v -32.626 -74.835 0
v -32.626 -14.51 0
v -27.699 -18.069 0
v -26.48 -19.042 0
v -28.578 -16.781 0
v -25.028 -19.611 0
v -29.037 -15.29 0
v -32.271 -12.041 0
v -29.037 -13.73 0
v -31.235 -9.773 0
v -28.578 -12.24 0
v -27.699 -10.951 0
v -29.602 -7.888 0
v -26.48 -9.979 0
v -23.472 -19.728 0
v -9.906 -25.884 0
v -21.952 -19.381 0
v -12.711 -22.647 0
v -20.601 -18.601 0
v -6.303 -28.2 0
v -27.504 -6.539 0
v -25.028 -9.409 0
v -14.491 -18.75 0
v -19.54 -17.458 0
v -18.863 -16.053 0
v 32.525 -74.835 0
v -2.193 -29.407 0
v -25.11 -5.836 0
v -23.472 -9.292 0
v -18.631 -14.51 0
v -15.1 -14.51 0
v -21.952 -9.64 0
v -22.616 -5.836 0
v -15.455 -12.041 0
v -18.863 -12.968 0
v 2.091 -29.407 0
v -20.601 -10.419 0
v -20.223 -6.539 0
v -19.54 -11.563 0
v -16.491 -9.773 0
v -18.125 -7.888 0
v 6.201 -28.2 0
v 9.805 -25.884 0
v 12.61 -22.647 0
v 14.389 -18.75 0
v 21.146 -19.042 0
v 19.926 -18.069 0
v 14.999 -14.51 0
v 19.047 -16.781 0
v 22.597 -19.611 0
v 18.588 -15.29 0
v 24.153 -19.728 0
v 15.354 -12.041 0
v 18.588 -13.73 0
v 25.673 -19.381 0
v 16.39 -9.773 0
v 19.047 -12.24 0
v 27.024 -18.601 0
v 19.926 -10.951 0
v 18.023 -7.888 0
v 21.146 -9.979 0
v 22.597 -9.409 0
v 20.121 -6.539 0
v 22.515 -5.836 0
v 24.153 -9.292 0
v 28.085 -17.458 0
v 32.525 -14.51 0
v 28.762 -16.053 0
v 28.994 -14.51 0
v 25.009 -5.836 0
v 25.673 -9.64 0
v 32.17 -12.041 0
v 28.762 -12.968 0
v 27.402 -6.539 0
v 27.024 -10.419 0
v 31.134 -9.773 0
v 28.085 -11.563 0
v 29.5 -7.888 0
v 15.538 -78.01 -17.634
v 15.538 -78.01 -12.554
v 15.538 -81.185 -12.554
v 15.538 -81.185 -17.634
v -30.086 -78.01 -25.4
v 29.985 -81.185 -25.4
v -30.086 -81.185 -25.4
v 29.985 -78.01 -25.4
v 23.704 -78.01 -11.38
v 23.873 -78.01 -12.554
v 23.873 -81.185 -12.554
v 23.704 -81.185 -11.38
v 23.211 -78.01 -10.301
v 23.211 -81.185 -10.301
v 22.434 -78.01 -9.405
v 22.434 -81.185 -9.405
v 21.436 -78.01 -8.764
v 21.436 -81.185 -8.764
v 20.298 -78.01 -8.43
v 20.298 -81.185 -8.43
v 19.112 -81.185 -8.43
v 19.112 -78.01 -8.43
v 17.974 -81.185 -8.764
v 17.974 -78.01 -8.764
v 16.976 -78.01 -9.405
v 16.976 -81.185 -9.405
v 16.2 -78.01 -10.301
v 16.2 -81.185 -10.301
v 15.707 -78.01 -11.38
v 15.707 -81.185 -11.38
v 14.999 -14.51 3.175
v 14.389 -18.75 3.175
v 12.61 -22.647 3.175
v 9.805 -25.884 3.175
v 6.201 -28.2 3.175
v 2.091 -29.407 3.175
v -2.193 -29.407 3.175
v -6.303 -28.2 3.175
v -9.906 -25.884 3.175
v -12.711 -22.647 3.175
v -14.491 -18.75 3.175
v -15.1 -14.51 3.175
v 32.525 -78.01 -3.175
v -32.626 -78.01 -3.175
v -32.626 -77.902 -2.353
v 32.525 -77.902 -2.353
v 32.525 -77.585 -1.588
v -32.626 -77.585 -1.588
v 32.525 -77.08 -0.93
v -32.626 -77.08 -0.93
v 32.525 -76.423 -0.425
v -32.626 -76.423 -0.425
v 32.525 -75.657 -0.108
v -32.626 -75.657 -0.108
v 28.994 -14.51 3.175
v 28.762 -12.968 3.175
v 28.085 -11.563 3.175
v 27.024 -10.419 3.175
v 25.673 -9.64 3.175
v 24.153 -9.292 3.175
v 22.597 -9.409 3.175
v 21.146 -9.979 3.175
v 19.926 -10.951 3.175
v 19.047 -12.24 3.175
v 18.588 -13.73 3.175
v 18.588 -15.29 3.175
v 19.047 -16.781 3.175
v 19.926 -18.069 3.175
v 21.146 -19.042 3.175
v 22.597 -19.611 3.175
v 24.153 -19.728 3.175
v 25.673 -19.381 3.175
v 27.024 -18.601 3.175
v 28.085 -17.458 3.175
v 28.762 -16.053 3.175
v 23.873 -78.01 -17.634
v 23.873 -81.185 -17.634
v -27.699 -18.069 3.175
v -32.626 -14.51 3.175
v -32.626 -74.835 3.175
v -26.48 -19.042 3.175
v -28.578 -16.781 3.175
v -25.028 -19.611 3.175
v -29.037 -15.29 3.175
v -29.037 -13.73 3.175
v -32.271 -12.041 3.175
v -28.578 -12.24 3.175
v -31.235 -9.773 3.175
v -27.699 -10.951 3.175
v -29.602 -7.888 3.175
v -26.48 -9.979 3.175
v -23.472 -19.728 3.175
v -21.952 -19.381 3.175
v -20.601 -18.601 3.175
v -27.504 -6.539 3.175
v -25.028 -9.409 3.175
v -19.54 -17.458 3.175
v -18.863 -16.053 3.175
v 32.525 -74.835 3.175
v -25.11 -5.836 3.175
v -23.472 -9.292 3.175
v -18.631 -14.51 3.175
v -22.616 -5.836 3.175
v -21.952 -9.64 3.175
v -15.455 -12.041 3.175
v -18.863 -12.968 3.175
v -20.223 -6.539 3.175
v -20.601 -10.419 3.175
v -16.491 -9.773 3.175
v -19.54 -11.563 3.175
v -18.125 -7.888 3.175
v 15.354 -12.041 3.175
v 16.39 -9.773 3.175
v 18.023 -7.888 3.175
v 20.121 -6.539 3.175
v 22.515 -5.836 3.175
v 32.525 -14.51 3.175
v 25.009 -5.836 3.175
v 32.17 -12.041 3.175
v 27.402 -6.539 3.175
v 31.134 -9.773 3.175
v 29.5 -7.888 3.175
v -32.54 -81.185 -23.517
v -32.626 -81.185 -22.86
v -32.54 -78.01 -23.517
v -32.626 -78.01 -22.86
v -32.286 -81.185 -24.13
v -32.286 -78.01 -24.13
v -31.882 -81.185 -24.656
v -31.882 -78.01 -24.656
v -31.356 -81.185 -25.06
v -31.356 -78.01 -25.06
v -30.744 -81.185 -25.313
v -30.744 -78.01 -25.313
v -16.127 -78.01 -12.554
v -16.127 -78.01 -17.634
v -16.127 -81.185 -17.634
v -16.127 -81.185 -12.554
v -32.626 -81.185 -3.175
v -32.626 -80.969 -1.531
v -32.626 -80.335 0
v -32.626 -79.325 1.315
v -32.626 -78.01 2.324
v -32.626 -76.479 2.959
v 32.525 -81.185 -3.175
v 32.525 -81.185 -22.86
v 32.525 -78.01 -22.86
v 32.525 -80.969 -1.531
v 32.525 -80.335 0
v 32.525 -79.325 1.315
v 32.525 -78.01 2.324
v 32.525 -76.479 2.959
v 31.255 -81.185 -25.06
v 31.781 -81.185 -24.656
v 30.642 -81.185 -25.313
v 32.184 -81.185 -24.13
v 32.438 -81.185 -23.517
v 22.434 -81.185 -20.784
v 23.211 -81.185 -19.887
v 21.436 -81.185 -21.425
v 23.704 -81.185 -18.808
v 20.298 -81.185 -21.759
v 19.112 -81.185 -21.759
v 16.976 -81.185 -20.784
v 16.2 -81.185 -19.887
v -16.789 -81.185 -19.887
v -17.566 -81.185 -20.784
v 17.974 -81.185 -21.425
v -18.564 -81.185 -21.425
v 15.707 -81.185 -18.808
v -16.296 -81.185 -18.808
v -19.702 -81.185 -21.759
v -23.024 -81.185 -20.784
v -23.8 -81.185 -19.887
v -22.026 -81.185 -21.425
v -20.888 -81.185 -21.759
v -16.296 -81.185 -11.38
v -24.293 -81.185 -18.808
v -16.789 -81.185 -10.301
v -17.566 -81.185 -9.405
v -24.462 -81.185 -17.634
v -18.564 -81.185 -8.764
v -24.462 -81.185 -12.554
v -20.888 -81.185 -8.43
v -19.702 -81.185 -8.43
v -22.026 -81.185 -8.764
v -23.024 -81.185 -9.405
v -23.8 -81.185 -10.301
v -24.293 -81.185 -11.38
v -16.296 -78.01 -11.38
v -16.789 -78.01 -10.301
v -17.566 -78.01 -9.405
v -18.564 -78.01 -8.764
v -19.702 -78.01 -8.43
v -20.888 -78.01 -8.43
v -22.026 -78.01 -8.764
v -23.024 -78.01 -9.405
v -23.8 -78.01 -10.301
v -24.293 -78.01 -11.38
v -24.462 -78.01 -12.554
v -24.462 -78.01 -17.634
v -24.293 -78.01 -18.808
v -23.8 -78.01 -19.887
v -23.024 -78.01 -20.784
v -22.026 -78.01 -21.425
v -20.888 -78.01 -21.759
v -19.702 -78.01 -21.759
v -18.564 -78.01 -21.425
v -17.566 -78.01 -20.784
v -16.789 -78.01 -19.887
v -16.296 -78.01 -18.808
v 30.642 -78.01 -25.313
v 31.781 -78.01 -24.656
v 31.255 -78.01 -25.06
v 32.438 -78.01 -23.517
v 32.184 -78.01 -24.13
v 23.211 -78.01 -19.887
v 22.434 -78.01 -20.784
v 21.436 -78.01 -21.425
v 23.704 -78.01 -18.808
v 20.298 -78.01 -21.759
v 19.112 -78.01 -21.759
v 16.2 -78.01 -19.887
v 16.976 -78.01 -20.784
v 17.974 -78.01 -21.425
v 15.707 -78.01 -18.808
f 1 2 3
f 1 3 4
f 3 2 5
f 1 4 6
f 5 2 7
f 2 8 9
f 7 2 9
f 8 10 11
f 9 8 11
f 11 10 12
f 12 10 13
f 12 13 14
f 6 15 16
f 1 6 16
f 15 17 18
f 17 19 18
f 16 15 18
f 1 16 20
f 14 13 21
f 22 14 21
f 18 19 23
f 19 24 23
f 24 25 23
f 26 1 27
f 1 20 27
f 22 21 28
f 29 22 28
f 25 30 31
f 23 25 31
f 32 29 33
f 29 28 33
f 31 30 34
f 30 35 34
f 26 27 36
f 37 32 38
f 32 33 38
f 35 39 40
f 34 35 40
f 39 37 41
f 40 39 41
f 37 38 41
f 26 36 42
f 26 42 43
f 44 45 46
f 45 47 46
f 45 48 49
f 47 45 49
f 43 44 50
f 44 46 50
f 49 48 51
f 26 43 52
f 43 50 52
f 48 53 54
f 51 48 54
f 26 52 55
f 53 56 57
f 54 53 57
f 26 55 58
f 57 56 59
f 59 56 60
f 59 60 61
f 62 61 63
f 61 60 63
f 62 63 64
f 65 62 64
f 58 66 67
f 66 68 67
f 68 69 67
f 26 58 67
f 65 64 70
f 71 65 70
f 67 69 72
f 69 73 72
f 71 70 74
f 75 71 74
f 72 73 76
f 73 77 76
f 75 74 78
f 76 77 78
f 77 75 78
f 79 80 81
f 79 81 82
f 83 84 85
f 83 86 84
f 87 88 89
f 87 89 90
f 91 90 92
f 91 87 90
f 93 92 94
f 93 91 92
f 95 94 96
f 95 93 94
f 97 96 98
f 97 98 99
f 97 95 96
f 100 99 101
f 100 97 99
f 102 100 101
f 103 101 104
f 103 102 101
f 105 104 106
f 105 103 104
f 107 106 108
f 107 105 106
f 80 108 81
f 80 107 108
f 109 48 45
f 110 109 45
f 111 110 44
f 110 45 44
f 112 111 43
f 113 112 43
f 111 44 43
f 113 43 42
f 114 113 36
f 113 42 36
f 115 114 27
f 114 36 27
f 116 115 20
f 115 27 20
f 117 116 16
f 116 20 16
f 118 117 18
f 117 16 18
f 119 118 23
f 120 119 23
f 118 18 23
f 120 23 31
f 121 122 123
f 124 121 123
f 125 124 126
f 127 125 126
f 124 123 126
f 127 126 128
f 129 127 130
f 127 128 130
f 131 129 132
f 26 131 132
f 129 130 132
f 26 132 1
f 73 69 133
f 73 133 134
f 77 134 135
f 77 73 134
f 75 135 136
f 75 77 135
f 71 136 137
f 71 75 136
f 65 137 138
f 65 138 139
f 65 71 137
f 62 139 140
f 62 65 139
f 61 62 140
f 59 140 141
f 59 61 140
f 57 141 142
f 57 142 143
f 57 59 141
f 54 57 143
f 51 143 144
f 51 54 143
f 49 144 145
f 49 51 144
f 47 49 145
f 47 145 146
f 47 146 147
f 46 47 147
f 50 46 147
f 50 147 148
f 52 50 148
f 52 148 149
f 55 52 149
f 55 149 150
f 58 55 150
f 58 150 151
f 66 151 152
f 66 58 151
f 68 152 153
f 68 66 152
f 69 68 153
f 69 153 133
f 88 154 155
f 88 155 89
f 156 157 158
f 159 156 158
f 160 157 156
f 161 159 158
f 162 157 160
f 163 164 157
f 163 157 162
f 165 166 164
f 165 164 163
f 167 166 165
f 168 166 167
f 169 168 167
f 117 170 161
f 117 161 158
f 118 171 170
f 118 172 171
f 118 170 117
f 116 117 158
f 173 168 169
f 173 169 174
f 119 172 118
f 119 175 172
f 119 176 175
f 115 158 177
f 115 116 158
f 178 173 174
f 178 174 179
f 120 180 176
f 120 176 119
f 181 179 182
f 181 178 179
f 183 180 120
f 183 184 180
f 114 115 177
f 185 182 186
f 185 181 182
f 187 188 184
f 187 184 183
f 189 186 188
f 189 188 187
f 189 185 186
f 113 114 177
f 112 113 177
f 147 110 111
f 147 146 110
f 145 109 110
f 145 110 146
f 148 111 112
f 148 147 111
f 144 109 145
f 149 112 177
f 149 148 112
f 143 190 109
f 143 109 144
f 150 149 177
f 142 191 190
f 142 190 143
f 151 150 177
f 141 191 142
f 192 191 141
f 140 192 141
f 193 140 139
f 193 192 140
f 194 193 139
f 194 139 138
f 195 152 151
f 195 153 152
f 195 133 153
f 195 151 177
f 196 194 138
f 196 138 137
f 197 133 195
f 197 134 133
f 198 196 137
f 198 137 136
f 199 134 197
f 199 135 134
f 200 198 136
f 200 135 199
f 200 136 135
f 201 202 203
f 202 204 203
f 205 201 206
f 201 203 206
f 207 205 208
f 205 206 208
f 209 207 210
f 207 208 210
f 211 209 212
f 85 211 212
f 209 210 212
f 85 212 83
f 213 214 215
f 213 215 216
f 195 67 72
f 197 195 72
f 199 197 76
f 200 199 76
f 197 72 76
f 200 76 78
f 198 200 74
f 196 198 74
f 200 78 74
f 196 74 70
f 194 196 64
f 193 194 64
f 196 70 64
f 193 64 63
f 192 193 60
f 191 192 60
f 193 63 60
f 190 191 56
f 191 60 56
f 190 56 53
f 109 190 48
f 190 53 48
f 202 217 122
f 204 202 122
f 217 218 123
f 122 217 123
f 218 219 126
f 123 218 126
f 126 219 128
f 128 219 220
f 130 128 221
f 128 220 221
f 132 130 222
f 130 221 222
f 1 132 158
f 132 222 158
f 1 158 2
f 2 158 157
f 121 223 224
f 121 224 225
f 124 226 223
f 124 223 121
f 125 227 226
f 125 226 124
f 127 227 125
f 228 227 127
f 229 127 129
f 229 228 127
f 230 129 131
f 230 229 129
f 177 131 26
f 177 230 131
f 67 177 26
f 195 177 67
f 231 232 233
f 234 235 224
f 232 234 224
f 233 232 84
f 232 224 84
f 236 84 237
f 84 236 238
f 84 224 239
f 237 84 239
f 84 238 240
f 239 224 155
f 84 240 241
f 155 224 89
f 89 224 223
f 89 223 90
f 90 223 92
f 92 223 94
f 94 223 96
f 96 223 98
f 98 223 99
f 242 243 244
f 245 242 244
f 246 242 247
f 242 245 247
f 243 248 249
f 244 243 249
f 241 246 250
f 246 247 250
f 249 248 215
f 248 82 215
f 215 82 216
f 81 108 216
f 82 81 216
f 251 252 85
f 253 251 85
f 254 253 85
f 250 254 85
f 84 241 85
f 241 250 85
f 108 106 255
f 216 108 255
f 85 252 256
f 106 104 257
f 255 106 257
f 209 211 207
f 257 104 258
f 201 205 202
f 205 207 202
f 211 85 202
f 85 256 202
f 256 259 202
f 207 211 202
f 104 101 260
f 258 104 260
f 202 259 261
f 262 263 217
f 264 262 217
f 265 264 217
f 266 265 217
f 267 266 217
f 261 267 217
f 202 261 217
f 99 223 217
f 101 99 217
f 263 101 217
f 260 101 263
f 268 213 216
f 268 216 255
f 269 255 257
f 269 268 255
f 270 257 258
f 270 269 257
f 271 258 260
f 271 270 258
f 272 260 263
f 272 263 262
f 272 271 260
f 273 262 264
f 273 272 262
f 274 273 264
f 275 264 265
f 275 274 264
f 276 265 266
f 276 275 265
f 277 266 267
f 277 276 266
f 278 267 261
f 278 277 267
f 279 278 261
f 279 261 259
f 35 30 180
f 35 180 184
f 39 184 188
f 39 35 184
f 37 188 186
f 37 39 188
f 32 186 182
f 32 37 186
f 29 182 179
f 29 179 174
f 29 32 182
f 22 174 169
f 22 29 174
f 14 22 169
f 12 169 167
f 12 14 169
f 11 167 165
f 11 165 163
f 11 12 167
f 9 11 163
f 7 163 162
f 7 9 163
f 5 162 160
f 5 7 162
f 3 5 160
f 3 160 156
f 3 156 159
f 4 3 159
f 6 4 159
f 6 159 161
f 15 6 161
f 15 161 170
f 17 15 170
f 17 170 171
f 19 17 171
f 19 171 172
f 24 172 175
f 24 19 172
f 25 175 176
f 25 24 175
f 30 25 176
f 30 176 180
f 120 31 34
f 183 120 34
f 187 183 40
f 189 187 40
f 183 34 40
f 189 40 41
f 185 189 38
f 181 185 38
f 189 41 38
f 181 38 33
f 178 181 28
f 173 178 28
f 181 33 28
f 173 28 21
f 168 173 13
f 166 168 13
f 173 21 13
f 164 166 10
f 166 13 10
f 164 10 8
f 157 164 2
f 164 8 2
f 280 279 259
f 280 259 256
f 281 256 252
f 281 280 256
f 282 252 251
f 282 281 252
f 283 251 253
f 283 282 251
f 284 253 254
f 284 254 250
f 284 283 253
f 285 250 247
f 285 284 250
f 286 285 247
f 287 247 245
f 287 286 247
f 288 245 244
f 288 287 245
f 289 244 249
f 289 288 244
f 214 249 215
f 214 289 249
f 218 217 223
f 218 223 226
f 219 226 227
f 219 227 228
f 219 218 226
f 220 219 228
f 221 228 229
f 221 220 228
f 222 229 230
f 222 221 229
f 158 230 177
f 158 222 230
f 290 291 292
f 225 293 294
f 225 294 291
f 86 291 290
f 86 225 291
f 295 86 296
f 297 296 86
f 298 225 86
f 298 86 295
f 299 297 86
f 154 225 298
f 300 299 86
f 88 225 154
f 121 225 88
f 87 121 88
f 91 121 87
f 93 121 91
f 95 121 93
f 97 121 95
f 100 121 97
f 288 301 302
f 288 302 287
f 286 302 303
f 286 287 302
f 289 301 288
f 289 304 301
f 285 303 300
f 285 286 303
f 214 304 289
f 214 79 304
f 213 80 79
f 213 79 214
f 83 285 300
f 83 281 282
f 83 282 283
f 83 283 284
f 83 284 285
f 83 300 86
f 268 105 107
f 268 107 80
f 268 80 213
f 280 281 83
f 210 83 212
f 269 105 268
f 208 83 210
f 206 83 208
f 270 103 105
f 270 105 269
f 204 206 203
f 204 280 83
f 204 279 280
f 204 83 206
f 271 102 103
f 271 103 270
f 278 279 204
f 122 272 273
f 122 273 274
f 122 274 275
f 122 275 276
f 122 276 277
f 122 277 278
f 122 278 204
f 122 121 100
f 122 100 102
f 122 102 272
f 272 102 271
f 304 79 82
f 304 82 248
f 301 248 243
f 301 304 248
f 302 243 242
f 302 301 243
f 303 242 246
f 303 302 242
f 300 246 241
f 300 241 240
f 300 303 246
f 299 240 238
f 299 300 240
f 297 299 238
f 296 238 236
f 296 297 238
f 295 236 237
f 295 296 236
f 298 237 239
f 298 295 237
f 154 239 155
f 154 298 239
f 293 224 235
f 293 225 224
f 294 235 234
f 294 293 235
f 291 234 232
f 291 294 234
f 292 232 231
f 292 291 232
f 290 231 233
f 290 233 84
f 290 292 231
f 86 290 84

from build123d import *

# Parameters (mm, degrees)
SKETCH1_R              = 5.2324
BOSS_EXTRUDE1_DEPTH    = 3.175
SKETCH2_W              = 65.151
SKETCH2_H              = 3.175
BOSS_EXTRUDE2_DEPTH    = 25.4
FILLET1_R              = 2.54
CUT_EXTRUDE1_DEPTH     = 3.175
CONVERT_SOLID1_START   = -32.6263
CONVERT_SOLID1_DEPTH   = 65.151
CONVERT_SOLID1_2_DEPTH = 65.151


# Read off the part's stored shape, not the designer's step: Convert-Solid1
with BuildPart() as part:
    # Sketch1 → Boss-Extrude1 (new body)
    with BuildSketch(Plane.XY):
        with BuildLine():
            Line((32.5247, -81.185268118), (32.5247, -14.510268118))
            ThreePointArc((32.5247, -14.510268118), (23.7617, -5.747268118), (14.9987, -14.510268118))
            ThreePointArc((14.9987, -14.510268118), (-0.0508, -29.559768118), (-15.1003, -14.510268118))
            ThreePointArc((-15.1003, -14.510268118), (-23.8633, -5.747268118), (-32.6263, -14.510268118))
            Line((-32.6263, -14.510268118), (-32.6263, -81.185268118))
            Line((-32.6263, -81.185268118), (32.5247, -81.185268118))
        make_face()
        with Locations((-23.8633, -14.510268118)):
            Circle(SKETCH1_R, mode=Mode.SUBTRACT)
        with Locations((23.7617, -14.510268118)):
            Circle(SKETCH1_R, mode=Mode.SUBTRACT)
    extrude(amount=BOSS_EXTRUDE1_DEPTH)

    # Sketch2 → Boss-Extrude2 (add)
    with BuildSketch(Plane(origin=(0, 0, 0), x_dir=(-1, 0, 0), z_dir=(0, 0, -1))):
        with Locations((0.0508, -79.597768118)):
            Rectangle(SKETCH2_W, SKETCH2_H)
    extrude(amount=BOSS_EXTRUDE2_DEPTH)

    # Fillet1
    fillet1_edges = [part.edges().sort_by_distance(p)[0] for p in [
        (32.5247, -79.597768118, -25.4),
        (-32.6263, -79.597768118, -25.4),
    ]]
    fillet(fillet1_edges, radius=FILLET1_R)

    # Sketch3 → Cut-Extrude1 (cut)
    with BuildSketch(Plane(origin=(0, -78.010268118, 0), x_dir=(1, 0, 0), z_dir=(0, 1, 0))):
        with BuildLine():
            Line((15.538165915, 12.554273752), (15.538165915, 17.634273752))
            ThreePointArc((15.538165915, 17.634273752), (19.705353415, 21.801461252), (23.872540915, 17.634273752))
            Line((23.872540915, 17.634273752), (23.872540915, 12.554273752))
            ThreePointArc((23.872540915, 12.554273752), (19.705353415, 8.387086252), (15.538165915, 12.554273752))
        make_face()
        with BuildLine():
            Line((-24.461834085, 12.554273752), (-24.461834085, 17.634273752))
            ThreePointArc((-24.461834085, 17.634273752), (-20.294646585, 21.801461252), (-16.127459085, 17.634273752))
            Line((-16.127459085, 17.634273752), (-16.127459085, 12.554273752))
            ThreePointArc((-16.127459085, 12.554273752), (-20.294646585, 8.387086252), (-24.461834085, 12.554273752))
        make_face()
    extrude(amount=-CUT_EXTRUDE1_DEPTH, mode=Mode.SUBTRACT)

    # Convert-Solid1 outline → Convert-Solid1 (cut)
    with BuildSketch(Plane.YZ.offset(CONVERT_SOLID1_START)):
        with BuildLine():
            Line((-81.185268118, 3.175), (-81.185268118, -3.175))
            ThreePointArc((-81.185268118, -3.175), (-79.325396179, 1.315128061), (-74.835268118, 3.175))
            Line((-74.835268118, 3.175), (-81.185268118, 3.175))
        make_face()
    extrude(amount=CONVERT_SOLID1_DEPTH, mode=Mode.SUBTRACT)

    # Convert-Solid1 2 outline → Convert-Solid1 2 (add)
    with BuildSketch(Plane.YZ.offset(CONVERT_SOLID1_START)):
        with BuildLine():
            Line((-78.010268118, 0), (-78.010268118, -3.175))
            ThreePointArc((-78.010268118, -3.175), (-77.080332148, -0.92993597), (-74.835268118, 0))
            Line((-74.835268118, 0), (-78.010268118, 0))
        make_face()
    extrude(amount=CONVERT_SOLID1_2_DEPTH)


solid = part.part
